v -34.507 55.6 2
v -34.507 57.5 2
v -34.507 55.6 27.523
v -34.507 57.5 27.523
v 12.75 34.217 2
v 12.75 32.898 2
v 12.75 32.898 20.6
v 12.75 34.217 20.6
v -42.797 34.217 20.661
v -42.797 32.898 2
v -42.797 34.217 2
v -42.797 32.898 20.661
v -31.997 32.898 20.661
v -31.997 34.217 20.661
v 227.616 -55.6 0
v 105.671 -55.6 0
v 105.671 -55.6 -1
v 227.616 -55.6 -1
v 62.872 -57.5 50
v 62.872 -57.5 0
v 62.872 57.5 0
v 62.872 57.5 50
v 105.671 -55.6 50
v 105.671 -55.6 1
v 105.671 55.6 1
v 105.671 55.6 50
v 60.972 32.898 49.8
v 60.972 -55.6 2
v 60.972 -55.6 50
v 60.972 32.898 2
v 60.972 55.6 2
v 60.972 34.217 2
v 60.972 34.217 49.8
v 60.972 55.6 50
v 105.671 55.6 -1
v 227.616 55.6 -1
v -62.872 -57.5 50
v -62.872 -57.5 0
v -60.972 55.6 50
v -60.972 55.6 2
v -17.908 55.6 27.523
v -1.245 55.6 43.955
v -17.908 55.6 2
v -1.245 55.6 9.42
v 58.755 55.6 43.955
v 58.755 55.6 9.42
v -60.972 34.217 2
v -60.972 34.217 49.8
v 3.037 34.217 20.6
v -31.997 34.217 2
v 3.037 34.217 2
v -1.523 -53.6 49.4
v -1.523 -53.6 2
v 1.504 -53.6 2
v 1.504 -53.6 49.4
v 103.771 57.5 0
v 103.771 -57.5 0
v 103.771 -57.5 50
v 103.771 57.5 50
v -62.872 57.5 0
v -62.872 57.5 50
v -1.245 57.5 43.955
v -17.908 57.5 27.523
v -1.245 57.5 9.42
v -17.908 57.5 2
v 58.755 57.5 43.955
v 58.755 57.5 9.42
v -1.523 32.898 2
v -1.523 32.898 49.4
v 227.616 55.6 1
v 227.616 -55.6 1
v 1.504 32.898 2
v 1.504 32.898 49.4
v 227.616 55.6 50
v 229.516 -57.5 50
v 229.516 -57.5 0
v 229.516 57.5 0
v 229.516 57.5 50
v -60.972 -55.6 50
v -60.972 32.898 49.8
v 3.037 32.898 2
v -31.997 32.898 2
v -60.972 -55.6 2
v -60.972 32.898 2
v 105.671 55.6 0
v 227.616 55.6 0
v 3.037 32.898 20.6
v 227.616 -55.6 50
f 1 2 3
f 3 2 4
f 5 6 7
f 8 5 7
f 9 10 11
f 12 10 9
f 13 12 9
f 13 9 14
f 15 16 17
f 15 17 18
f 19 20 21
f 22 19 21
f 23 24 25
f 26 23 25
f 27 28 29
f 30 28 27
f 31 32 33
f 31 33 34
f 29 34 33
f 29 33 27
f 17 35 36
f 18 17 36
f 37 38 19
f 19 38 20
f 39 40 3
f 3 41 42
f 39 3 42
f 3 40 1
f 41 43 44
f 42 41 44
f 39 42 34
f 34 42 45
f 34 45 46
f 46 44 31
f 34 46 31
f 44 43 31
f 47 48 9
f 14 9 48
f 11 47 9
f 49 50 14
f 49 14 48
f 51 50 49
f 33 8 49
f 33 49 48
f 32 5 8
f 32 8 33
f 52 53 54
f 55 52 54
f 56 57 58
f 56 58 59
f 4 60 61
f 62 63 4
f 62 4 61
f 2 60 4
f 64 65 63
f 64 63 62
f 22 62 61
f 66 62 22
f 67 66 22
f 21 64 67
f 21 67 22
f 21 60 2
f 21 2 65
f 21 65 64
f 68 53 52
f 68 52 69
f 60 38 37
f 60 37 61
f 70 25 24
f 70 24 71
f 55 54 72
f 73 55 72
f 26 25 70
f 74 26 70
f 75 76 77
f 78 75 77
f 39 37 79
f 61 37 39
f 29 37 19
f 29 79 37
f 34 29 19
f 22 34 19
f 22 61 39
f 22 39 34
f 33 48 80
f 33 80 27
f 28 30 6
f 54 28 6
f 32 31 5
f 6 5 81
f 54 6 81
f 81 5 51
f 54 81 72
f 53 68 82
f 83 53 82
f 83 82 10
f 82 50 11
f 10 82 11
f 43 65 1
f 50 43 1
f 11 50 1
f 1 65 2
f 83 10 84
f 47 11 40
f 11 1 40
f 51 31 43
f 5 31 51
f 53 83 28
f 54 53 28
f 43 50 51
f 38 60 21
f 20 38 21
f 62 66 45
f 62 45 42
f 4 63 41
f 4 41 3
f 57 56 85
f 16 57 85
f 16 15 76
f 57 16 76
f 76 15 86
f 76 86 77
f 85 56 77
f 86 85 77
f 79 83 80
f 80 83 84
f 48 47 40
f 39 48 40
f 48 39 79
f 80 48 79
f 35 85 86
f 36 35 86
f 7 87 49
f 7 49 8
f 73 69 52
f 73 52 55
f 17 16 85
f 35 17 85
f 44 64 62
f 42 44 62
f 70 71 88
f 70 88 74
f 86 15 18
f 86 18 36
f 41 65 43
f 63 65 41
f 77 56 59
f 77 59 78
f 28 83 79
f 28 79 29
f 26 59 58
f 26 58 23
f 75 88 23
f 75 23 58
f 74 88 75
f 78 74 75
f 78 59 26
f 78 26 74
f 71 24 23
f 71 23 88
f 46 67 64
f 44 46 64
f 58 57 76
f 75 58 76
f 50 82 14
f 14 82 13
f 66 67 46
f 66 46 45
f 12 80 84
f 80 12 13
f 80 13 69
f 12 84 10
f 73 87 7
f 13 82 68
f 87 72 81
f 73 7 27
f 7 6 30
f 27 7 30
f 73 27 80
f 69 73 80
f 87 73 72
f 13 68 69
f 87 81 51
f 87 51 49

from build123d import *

# Parameters (mm, degrees)
F0_W      = 125.744625926
F0_H      = 115
F0_W_2    = 121.944625926
F0_H_2    = 111.2
F1_DEPTH  = 50
F2_DEPTH  = 2
F0_W_3    = 125.745
F0_W_4    = 121.945
F3_DEPTH  = 50
F4_DEPTH  = 1
F5_W      = 60
F5_H      = 34.5351266117
F6_DEPTH  = 12.5
F5_W_2    = 16.599290514
F5_H_2    = 25.5229242526
F8_W      = 121.944625926
F8_H      = 1.3195425272
F9_DEPTH  = 47.8
F10_W     = 10.8003032585
F10_H     = 18.6611273349
F11_DEPTH = 12.5
F10_W_2   = 9.7123030573
F10_H_2   = 18.5998911038
F13_W     = 3.026663198
F13_H     = 86.4978486359
F14_DEPTH = 47.4


# Not quite as in the source:
# - the program builds the solid bodies; features that only make, move or delete a surface that nothing else refers to are left out


with BuildPart() as f1:
    # F0 (on Top) → F1 (new body)
    with BuildSketch(Plane.XY):
        Rectangle(F0_W, F0_H)
        Rectangle(F0_W_2, F0_H_2, mode=Mode.SUBTRACT)
    extrude(amount=F1_DEPTH)

    # F0 (on Top) → F2 (join)
    with BuildSketch(Plane.XY):
        Rectangle(F0_W, F0_H)
        Rectangle(F0_W_2, F0_H_2, mode=Mode.SUBTRACT)
        Rectangle(F0_W_2, F0_H_2)
    extrude(amount=F2_DEPTH)


with BuildPart() as f3:
    # F0 (on Top) → F3 (new body)
    with BuildSketch(Plane.XY):
        with Locations((166.6439622641, 0)):
            Rectangle(F0_W_3, F0_H)
        with Locations((166.6439622641, 0)):
            Rectangle(F0_W_4, F0_H_2, mode=Mode.SUBTRACT)
    extrude(amount=F3_DEPTH)

    # F0 (on Top) → F4 (join, symmetric)
    with BuildSketch(Plane.XY):
        with Locations((166.6439622641, 0)):
            Rectangle(F0_W_4, F0_H_2)
    extrude(amount=F4_DEPTH, both=True)


with BuildPart() as f6:
    # F5 (on face) → F6 (new body, symmetric)
    with BuildSketch(Plane(origin=(0, 57.5, 0), x_dir=(-1, 0, 0), z_dir=(0, 1, 0))):
        with Locations((-28.7545890035, 26.6873809322)):
            Rectangle(F5_W, F5_H)
    extrude(amount=F6_DEPTH, both=True)


with BuildPart() as f6b:
    # F5 (on face) → F6, piece 2 (new body, symmetric)
    with BuildSketch(Plane(origin=(0, 57.5, 0), x_dir=(-1, 0, 0), z_dir=(0, 1, 0))):
        with Locations((26.2074469038, 14.7614621263)):
            Rectangle(F5_W_2, F5_H_2)
    extrude(amount=F6_DEPTH, both=True)


with BuildPart() as f1_1:
    add(f1.part)

    # F7: cut F6, F6b
    add(f6.part, mode=Mode.SUBTRACT)
    add(f6b.part, mode=Mode.SUBTRACT)

    # F8 (on face) → F9 (join)
    with BuildSketch(Plane.XY.offset(2)):
        with Locations((0, 33.5576198995)):
            Rectangle(F8_W, F8_H)
    extrude(amount=F9_DEPTH)


with BuildPart() as f11:
    # F10 (on face) → F11 (new body, symmetric)
    with BuildSketch(Plane.XZ.offset(-32.8978486359)):
        with Locations((-37.3966544867, 11.3305636675)):
            Rectangle(F10_W, F10_H)
    extrude(amount=F11_DEPTH, both=True)


with BuildPart() as f11b:
    # F10 (on face) → F11, piece 2 (new body, symmetric)
    with BuildSketch(Plane.XZ.offset(-32.8978486359)):
        with Locations((7.8935725614, 11.2999455519)):
            Rectangle(F10_W_2, F10_H_2)
    extrude(amount=F11_DEPTH, both=True)


with BuildPart() as f1_2:
    add(f1_1.part)

    # F12: cut F11, F11b
    add(f11.part, mode=Mode.SUBTRACT)
    add(f11b.part, mode=Mode.SUBTRACT)

    # F13 (on face) → F14 (join)
    with BuildSketch(Plane.XY.offset(2)):
        with Locations((-0.0097909417, -10.351075682)):
            Rectangle(F13_W, F13_H)
    extrude(amount=F14_DEPTH)


solid = Compound([f3.part, f1_2.part])
